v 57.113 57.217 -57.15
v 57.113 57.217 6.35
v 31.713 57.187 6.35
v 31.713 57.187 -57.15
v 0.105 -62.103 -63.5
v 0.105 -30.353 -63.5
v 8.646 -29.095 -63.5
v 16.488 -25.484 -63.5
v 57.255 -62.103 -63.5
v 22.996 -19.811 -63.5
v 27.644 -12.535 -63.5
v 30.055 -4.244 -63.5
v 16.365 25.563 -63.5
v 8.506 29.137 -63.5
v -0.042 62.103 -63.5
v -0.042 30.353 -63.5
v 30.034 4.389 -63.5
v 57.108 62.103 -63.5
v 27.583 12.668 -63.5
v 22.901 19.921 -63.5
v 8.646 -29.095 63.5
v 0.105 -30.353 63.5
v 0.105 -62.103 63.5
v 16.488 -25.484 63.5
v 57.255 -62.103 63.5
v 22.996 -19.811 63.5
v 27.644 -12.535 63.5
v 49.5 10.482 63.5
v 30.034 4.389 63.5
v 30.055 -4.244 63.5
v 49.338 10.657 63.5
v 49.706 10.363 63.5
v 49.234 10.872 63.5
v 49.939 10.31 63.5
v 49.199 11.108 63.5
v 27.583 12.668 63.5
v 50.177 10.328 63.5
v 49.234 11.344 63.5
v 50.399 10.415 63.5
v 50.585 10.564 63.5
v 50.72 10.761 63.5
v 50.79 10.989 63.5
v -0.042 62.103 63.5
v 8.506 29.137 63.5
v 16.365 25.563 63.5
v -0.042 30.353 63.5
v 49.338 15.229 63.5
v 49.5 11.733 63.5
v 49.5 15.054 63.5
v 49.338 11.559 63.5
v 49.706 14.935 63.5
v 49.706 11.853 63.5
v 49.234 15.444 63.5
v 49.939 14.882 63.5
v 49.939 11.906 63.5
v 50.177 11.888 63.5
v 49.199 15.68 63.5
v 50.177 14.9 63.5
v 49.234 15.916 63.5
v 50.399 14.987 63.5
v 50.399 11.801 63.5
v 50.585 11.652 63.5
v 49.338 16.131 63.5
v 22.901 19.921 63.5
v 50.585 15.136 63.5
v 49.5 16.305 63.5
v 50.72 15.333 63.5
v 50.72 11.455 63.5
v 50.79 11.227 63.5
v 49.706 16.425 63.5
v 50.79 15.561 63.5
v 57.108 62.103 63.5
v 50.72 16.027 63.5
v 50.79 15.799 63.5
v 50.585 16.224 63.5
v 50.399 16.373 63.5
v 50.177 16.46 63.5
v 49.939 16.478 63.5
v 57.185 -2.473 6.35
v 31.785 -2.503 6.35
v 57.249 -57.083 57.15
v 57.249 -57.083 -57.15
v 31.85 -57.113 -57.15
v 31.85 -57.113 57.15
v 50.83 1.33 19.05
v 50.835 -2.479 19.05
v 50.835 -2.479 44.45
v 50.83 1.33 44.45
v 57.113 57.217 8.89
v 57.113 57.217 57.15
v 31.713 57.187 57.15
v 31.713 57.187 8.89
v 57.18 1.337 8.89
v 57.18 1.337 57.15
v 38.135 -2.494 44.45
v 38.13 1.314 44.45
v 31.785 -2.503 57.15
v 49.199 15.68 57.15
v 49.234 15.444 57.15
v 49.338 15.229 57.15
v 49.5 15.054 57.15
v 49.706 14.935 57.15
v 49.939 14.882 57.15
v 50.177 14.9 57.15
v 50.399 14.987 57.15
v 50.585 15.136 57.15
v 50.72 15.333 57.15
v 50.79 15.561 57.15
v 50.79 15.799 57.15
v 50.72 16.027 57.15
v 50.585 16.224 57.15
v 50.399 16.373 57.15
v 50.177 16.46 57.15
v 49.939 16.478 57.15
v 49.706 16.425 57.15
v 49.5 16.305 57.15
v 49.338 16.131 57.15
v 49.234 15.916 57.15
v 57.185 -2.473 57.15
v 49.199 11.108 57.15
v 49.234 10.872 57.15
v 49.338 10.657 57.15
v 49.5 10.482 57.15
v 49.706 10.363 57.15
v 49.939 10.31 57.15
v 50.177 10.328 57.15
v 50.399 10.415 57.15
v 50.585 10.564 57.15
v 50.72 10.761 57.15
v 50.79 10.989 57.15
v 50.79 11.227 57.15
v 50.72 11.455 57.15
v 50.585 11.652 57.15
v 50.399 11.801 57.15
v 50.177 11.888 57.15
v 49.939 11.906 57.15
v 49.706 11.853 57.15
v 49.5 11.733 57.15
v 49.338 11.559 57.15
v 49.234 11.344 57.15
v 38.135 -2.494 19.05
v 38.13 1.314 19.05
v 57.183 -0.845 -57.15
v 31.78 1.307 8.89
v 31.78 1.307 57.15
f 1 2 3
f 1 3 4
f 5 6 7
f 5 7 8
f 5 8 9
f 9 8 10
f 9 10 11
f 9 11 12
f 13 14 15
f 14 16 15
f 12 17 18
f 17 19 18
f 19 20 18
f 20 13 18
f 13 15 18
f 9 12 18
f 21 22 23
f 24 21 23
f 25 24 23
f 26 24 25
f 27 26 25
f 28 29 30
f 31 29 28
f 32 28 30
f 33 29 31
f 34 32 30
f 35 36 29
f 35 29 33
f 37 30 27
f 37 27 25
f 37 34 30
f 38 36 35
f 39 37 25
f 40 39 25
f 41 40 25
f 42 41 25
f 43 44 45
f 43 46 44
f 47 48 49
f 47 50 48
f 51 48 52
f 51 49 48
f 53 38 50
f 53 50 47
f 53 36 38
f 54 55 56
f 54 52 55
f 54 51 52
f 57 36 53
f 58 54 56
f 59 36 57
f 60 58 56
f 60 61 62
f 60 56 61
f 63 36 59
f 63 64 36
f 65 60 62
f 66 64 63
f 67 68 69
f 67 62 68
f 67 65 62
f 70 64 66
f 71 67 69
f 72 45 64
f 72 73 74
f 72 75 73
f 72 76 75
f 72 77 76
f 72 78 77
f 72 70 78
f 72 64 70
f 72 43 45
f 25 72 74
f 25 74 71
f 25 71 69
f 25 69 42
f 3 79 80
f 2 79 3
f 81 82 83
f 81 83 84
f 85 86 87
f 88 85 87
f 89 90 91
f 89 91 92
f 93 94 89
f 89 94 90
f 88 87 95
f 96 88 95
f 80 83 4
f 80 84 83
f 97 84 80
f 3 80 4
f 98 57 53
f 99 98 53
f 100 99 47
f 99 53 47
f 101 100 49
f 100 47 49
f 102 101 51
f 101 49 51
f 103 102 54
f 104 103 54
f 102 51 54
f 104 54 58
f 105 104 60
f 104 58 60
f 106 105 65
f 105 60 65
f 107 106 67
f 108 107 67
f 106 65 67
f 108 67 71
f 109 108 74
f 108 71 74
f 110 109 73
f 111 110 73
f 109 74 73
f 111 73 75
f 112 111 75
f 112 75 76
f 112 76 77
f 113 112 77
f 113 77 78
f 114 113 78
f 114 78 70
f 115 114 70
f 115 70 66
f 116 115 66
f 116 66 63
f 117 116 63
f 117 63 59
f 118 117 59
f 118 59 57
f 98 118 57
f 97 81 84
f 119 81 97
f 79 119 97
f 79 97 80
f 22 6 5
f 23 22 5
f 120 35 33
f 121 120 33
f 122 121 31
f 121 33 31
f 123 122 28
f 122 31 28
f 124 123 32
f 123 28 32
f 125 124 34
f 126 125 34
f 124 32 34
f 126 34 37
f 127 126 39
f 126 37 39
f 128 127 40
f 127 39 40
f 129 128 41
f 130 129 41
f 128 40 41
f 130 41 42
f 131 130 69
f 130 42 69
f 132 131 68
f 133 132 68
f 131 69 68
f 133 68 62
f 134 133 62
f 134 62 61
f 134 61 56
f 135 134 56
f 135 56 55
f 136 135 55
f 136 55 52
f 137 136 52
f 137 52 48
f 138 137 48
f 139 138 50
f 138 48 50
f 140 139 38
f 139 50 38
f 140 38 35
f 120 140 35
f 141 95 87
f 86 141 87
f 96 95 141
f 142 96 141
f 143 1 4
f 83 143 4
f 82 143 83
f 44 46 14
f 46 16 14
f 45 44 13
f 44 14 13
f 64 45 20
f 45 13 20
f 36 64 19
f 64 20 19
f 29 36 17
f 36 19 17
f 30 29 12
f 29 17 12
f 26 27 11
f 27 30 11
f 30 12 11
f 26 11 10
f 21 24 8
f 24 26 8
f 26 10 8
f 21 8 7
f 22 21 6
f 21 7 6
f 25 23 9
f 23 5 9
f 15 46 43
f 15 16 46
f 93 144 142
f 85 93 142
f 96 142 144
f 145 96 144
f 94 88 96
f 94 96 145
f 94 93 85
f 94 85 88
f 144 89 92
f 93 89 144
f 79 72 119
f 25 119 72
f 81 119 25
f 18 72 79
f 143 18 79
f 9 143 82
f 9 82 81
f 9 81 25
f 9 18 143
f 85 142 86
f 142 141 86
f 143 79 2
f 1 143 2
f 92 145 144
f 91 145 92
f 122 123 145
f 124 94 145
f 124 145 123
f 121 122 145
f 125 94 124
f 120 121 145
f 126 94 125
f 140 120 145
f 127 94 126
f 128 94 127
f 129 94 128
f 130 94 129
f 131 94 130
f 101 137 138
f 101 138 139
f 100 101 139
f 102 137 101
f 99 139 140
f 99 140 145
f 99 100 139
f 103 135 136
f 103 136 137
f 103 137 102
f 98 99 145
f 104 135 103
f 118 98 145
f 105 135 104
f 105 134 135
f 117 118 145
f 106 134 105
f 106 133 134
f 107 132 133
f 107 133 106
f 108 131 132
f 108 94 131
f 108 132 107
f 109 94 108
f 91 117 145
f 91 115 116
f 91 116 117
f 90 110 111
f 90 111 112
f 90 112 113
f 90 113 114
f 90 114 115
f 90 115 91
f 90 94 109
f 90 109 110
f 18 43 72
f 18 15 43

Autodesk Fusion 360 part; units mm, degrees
sketch "Sketch1" plane through (0, 0, 0) normal (0, 0, 1) x (1, 0, 0)
  arc A0 (0.1047, -30.3528) -> (-0.0415, 30.353) centre (0, 0) ccw
  line L0 (-0.0415, 30.353) -> (-0.0415, 62.103)
  line L1 (0.1047, -30.3528) -> (0.1047, -62.1028)
  line L2 (-0.0415, 62.103) -> (57.1085, 62.103)
  line L3 (0.1047, -62.1028) -> (57.2547, -62.1028)
  line L4 (57.1085, 62.103) -> (57.2547, -62.1028)
  dimension "d1" = 60.706
  dimension "d10" = 31.75
  dimension "d12" = 57.15
extrude "Extrude1" add sketch "Sketch1" along normal mid plane 127
sketch "Sketch4" plane through (57.1815, 0.0673, 0) normal (1, 0.0012, 0) x (-0.0012, 1, 0)
  line L0 (62.0357, -63.5) -> (62.0357, 63.5)
  line L1 (62.0357, 63.5) -> (-62.1702, 63.5)
  line L2 (-62.1702, 63.5) -> (-62.1702, -63.5)
  line L3 (-62.1702, -63.5) -> (62.0357, -63.5)
  line L4 (57.15, -57.15) -> (-57.15, -57.15)
  line L5 (-57.15, -57.15) -> (-57.15, 57.15)
  line L6 (-57.15, 57.15) -> (-2.54, 57.15)
  line L7 (57.15, 6.35) -> (57.15, -57.15)
  line L8 (57.15, -57.15) -> (-57.15, 57.15) construction
  line L9 (-57.15, -57.15) -> (57.15, 57.15) construction
  line L10 (-2.54, 57.15) -> (-2.54, 6.35)
  line L11 (-2.54, 6.35) -> (57.15, 6.35)
  dimension "d21" = 114.3
  dimension "d22" = 114.3
  dimension "d35" = 59.69
  dimension "d36" = 50.8
extrude "Extrude3" cut sketch "Sketch4" against normal blind 25.4 contours L4 L5 L6 L7 L10 L11
sketch "Sketch6" plane through (57.1815, 0.0673, 0) normal (1, 0.0012, 0) x (-0.0012, 1, 0)
  line L0 (-57.15, 57.15) -> (-2.54, 57.15)
  line L1 (-2.54, 57.15) -> (-2.54, 6.35)
  line L2 (-2.54, 6.35) -> (57.15, 6.35)
  line L3 (57.15, 6.35) -> (57.15, -57.15)
  line L4 (57.15, -57.15) -> (-57.15, -57.15)
  line L5 (-57.15, -57.15) -> (-57.15, 57.15)
  line L6 (62.0357, -63.5) -> (62.0357, 63.5)
  line L7 (62.0357, 63.5) -> (-62.1702, 63.5)
  line L8 (-62.1702, 63.5) -> (-62.1702, -63.5)
  line L9 (-62.1702, -63.5) -> (62.0357, -63.5)
  line L10 (1.27, 57.15) -> (57.15, 57.15)
  line L11 (57.15, 57.15) -> (57.15, 8.89)
  line L12 (57.15, 8.89) -> (1.27, 8.89)
  line L13 (1.27, 8.89) -> (1.27, 57.15)
  dimension "d37" = 55.88
  dimension "d38" = 48.26
extrude "Extrude5" cut sketch "Sketch6" against normal blind 25.4 contours L10 L11 L12 L13
sketch "Sketch8" plane through (0, 0, 63.5) normal (0, 0, 1) x (-1, 0, 0)
  line L0 (-0.1047, 30.3528) -> (-0.1047, 62.1028)
  line L1 (-0.1047, 62.1028) -> (-57.2547, 62.1028)
  line L2 (-57.2547, 62.1028) -> (-57.1085, -62.103)
  line L3 (-57.1085, -62.103) -> (0.0415, -62.103)
  line L4 (0.0415, -62.103) -> (0.0415, -30.353)
  arc A0 (-0.1047, 30.3528) -> (0.0415, -30.353) centre (0, 0) ccw
  circle A1 centre (-49.9987, -11.1079) radius 0.8001
  circle A2 centre (-49.9987, -15.6799) radius 0.8001
  line L5 (-57.18, -1.3373) -> (-31.7801, -1.3074)
  dimension "d45" = 1.6002
  dimension "d46" = 4.572
  dimension "d47" = 9.779
extrude "Extrude6" cut sketch "Sketch8" against normal up to surface (6.35 mm away) contours A1 | A2
sketch "Sketch9" plane through (0.003, -2.54, 0) normal (0.0012, -1, 0) x (1, 0.0012, 0)
  line L0 (57.1816, 6.35) -> (57.1816, 57.15)
  line L1 (57.1816, 57.15) -> (31.7816, 57.15)
  line L2 (31.7816, 57.15) -> (31.7816, 6.35)
  line L3 (31.7816, 6.35) -> (57.1816, 6.35)
  line L4 (50.8316, 44.45) -> (38.1316, 44.45)
  line L5 (38.1316, 44.45) -> (38.1316, 19.05)
  line L6 (38.1316, 19.05) -> (50.8316, 19.05)
  line L7 (50.8316, 19.05) -> (50.8316, 44.45)
  dimension "d50" = 12.7
  dimension "d51" = 25.4
  dimension "d52" = 12.7
  dimension "d54" = 6.35
extrude "Extrude7" cut sketch "Sketch9" against normal up to surface (3.81 mm away) contours L4 L5 L6 L7
